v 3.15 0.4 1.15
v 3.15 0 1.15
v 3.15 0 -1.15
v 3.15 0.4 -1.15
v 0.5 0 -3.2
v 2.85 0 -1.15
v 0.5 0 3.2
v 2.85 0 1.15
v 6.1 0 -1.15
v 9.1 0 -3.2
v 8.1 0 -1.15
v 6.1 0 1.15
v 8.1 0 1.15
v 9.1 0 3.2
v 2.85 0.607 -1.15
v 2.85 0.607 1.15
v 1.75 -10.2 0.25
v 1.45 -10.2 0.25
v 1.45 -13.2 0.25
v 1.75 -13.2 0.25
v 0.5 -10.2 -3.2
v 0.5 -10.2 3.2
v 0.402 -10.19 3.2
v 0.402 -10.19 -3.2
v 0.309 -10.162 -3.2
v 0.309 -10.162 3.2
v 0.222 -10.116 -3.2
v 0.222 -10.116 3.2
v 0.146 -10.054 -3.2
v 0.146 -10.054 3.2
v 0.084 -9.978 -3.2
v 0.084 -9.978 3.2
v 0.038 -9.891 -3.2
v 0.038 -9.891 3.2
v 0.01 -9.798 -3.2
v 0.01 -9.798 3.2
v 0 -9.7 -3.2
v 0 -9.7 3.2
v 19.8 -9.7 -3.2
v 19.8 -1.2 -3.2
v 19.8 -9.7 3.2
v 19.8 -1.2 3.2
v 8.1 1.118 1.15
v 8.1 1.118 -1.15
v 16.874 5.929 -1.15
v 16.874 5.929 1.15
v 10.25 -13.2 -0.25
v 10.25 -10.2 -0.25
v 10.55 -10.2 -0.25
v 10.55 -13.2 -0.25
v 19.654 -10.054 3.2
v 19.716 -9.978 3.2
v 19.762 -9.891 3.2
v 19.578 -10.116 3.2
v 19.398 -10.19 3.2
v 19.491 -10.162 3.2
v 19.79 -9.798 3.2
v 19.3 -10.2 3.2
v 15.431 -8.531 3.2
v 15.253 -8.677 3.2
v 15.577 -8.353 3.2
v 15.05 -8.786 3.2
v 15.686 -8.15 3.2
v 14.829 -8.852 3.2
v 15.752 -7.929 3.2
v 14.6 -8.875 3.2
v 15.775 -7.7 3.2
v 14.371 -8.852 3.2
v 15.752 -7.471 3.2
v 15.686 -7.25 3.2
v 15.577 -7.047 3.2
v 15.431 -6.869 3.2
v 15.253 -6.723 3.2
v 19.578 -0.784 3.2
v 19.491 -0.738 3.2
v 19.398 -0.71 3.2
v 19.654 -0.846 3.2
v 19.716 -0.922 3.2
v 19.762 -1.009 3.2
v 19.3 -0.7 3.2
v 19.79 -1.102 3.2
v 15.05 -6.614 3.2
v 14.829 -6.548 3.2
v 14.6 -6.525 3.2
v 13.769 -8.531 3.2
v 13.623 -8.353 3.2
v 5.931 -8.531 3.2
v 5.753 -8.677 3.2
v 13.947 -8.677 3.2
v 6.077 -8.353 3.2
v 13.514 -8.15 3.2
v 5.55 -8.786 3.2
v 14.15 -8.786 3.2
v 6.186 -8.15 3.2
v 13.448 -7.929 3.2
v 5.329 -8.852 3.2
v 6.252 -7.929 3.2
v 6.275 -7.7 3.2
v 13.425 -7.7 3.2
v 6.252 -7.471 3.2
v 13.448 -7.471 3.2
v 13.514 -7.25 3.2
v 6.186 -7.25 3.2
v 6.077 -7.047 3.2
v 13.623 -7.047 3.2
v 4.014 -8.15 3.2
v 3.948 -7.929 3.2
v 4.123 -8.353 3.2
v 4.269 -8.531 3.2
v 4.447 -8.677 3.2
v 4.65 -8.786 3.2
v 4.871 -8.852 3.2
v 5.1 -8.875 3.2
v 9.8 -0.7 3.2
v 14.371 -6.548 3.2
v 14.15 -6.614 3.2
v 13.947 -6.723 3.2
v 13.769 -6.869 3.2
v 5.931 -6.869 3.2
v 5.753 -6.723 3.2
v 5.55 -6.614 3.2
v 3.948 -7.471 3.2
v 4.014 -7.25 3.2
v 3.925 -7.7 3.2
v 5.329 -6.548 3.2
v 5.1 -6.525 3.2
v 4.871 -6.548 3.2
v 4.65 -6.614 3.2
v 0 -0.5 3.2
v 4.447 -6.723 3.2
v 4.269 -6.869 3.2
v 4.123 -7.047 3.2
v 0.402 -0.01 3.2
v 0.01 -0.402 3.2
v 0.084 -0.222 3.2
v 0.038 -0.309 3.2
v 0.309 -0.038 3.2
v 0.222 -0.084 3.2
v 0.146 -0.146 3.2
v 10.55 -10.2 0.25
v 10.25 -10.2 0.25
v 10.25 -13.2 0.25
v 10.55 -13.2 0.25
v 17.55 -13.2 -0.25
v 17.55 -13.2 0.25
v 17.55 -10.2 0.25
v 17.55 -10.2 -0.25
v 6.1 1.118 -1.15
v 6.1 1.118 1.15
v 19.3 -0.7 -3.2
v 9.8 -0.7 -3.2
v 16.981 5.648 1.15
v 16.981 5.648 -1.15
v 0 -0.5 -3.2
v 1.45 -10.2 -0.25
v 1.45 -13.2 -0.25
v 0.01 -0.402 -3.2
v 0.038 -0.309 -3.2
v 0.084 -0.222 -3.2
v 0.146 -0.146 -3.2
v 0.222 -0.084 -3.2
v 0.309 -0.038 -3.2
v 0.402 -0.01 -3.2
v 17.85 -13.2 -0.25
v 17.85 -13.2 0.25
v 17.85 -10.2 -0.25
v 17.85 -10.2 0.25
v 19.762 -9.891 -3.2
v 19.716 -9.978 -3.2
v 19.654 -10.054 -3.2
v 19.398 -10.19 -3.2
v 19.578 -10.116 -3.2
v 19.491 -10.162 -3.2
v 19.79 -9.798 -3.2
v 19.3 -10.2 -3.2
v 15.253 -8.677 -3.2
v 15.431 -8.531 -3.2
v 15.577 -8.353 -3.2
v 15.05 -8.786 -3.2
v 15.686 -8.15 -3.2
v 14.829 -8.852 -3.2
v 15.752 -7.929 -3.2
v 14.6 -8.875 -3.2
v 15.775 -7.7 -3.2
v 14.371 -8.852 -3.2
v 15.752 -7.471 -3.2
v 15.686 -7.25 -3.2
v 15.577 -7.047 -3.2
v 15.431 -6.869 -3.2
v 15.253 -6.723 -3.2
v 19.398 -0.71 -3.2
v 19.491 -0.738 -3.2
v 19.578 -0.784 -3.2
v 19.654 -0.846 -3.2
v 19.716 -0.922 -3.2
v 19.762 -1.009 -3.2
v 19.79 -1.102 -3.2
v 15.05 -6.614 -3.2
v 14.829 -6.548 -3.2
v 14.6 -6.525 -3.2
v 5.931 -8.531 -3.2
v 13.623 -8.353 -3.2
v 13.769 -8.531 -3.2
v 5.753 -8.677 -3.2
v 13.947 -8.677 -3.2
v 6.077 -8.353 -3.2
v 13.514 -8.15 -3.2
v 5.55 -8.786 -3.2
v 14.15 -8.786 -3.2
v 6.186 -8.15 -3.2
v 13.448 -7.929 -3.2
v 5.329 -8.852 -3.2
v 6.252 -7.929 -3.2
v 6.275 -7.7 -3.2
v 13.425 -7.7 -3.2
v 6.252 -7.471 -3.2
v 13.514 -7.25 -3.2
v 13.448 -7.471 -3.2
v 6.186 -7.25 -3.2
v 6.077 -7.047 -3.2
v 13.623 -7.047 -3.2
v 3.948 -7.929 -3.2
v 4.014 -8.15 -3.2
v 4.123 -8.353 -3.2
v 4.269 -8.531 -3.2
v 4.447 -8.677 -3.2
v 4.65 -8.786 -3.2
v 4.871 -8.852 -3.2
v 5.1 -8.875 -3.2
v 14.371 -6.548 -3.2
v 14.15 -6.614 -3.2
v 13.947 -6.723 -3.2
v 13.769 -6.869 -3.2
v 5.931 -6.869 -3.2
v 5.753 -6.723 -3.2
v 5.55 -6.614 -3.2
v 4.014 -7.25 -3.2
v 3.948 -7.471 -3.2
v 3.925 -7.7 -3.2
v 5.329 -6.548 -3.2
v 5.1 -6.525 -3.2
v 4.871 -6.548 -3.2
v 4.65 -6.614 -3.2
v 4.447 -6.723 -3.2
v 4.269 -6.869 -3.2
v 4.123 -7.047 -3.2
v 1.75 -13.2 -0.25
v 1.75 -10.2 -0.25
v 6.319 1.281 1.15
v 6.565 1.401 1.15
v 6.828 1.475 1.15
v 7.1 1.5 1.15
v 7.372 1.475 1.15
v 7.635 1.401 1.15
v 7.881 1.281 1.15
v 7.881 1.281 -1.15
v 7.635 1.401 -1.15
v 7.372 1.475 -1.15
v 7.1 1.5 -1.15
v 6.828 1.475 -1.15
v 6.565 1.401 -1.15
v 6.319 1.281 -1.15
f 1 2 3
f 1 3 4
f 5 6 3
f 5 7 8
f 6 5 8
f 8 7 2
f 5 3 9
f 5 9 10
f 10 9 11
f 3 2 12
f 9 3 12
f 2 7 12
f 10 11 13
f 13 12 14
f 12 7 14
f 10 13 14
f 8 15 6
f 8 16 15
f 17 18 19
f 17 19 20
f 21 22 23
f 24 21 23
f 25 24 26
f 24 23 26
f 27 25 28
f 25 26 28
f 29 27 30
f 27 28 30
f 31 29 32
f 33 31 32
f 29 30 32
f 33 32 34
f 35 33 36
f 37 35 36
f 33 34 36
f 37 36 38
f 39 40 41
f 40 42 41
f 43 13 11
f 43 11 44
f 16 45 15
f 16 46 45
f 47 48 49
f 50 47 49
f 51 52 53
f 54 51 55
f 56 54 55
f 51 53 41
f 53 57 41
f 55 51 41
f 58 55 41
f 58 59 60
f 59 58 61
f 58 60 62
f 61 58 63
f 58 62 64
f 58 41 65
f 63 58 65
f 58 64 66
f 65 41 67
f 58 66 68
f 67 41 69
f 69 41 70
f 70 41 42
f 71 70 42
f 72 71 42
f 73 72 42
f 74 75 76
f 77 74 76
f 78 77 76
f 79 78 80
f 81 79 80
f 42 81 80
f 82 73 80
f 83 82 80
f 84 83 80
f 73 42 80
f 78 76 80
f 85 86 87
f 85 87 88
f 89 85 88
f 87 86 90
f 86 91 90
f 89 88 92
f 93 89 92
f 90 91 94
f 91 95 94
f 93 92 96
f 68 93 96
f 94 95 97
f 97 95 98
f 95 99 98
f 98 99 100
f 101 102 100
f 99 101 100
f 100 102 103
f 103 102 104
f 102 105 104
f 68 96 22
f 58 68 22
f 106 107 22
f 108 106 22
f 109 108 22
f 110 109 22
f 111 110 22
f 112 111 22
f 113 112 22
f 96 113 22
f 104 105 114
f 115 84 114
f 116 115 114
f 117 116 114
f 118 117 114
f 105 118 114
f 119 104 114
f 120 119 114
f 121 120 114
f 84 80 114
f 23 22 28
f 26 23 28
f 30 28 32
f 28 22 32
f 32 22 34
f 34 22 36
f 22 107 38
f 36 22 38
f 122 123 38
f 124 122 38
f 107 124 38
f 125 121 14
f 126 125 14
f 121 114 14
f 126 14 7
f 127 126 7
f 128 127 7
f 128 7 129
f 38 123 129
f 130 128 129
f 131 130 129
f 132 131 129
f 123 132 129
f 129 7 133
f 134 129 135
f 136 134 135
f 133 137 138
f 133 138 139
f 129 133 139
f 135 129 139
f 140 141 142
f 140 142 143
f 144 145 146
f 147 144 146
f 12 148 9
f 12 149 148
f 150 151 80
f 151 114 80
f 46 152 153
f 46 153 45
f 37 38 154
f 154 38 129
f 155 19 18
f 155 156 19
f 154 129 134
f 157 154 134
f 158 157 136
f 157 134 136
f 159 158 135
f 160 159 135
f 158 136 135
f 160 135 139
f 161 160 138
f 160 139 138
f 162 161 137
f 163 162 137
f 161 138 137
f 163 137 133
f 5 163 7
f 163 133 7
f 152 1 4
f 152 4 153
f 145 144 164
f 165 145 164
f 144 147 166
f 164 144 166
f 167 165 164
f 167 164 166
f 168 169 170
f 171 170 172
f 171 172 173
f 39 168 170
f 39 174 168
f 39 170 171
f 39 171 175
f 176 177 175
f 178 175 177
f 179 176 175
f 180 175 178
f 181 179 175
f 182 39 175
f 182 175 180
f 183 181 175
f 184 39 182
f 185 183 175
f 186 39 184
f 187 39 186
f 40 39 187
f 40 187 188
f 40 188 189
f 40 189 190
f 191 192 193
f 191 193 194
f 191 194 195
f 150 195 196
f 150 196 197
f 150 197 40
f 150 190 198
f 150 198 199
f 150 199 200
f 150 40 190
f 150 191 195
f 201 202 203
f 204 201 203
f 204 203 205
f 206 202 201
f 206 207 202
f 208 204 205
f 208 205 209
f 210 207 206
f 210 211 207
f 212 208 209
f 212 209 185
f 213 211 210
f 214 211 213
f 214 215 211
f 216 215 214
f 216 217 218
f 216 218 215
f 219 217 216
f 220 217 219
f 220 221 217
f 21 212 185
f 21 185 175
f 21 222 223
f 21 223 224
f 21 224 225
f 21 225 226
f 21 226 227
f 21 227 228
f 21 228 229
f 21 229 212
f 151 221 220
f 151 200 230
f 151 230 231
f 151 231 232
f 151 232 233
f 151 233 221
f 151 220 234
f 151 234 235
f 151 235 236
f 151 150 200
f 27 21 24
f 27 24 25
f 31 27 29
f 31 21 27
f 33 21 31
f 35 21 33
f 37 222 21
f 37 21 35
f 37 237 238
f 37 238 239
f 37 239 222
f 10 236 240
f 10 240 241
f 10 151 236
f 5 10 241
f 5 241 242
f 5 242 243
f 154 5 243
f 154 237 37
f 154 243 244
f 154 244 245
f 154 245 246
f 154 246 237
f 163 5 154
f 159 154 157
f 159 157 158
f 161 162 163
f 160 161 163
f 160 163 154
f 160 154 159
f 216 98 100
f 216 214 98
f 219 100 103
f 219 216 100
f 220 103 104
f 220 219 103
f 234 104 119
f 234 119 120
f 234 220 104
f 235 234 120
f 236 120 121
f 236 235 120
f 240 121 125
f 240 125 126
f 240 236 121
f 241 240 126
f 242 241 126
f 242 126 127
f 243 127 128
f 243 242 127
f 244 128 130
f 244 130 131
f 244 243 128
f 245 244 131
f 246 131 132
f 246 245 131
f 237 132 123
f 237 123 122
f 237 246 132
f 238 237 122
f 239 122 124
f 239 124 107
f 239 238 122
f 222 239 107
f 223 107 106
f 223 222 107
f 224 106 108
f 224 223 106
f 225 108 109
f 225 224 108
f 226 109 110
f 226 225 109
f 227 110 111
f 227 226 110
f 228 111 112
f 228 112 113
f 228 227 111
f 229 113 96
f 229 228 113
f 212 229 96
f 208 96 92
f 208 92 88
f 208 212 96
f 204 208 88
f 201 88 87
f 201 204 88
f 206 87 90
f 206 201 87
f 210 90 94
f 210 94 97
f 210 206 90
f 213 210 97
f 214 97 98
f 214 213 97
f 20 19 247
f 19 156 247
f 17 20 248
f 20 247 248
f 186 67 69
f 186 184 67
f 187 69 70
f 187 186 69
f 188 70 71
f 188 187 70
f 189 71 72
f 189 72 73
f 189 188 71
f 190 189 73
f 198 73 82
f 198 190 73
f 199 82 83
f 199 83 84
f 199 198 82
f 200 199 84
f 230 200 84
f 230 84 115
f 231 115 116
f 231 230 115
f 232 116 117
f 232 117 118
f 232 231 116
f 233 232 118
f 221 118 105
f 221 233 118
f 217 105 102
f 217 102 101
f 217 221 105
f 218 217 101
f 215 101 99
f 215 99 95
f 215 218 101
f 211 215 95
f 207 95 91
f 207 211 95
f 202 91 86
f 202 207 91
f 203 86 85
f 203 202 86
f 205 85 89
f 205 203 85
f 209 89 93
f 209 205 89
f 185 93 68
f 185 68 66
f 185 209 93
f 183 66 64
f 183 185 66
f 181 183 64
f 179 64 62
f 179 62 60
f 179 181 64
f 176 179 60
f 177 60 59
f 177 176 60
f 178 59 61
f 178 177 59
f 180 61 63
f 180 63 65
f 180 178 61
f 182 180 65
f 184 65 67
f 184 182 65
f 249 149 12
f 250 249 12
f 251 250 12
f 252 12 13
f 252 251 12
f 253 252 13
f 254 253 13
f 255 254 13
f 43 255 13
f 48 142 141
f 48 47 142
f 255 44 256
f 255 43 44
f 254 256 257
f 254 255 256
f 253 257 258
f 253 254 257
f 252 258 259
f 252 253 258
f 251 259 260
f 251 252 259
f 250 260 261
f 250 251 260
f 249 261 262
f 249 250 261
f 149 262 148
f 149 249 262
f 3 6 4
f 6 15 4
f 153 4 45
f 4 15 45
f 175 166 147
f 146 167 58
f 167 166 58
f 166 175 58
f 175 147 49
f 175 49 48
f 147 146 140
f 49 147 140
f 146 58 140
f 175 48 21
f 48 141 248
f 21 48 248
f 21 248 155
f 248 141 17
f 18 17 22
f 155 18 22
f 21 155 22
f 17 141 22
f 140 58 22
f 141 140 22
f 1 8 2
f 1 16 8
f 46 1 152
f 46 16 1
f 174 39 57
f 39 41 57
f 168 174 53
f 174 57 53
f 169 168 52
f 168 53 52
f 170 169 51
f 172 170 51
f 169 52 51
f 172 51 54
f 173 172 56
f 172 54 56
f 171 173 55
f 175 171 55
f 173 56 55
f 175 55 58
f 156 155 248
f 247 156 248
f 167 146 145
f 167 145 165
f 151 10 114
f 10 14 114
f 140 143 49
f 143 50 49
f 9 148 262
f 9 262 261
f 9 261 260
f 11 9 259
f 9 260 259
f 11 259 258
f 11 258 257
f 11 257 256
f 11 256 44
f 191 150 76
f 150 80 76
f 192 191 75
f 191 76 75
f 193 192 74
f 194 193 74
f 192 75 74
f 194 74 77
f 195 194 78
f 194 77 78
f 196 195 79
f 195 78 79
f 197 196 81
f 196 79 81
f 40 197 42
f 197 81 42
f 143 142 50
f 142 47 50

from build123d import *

# Parameters (mm, degrees)
SKETCH_1_R       = 1.175
EXTRUDE_1_DEPTH  = 3.2
EXTRUDE_2_DEPTH  = 1.15
EXTRUDE_10_DEPTH = 1.15
SKETCH_5_W       = 0.3
SKETCH_5_H       = 3
EXTRUDE_12_DEPTH = 0.25


with BuildPart() as part:
    # 草图1 → 凸台-拉伸1 (new, symmetric)
    with BuildSketch(Plane.XY):
        with BuildLine():
            Line((0.5, 0), (9.1, 0))
            Line((9.1, 0), (9.8, -0.7))
            Line((9.8, -0.7), (19.3, -0.7))
            ThreePointArc((19.3, -0.7), (19.653553391, -0.846446609), (19.8, -1.2))
            Line((19.8, -1.2), (19.8, -9.7))
            ThreePointArc((19.8, -9.7), (19.653553391, -10.053553391), (19.3, -10.2))
            Line((19.3, -10.2), (0.5, -10.2))
            ThreePointArc((0.5, -10.2), (0.146446609, -10.053553391), (0, -9.7))
            Line((0, -9.7), (0, -0.5))
            ThreePointArc((0, -0.5), (0.146446609, -0.146446609), (0.5, 0))
        make_face()
        with Locations((5.1, -7.7)):
            Circle(SKETCH_1_R, mode=Mode.SUBTRACT)
        with Locations((14.6, -7.7)):
            Circle(SKETCH_1_R, mode=Mode.SUBTRACT)
    extrude(amount=EXTRUDE_1_DEPTH, both=True)

    # 草图2 → 凸台-拉伸2 (add, symmetric)
    with BuildSketch(Plane.XY):
        with BuildLine():
            Line((6.1, 1.118033989), (6.1, 0))
            Line((6.1, 0), (8.1, 0))
            Line((8.1, 0), (8.1, 1.118033989))
            ThreePointArc((8.1, 1.118033989), (7.1, 1.5), (6.1, 1.118033989))
        make_face()
    extrude(amount=EXTRUDE_2_DEPTH, both=True)

    # 草图4 → 凸台-拉伸10 (add, symmetric)
    with BuildSketch(Plane.XY):
        Polygon((2.85, 0), (3.15, 0), (3.15, 0.4), (16.98060531, 5.648457972), (16.874167088, 5.928941314), (2.85, 0.60703024), align=None)
    extrude(amount=EXTRUDE_10_DEPTH, both=True)

    # 草图5 → 凸台-拉伸12 (add, symmetric)
    with BuildSketch(Plane.XY):
        with Locations((1.6, -11.7)):
            Rectangle(SKETCH_5_W, SKETCH_5_H)
        with Locations((10.4, -11.7)):
            Rectangle(SKETCH_5_W, SKETCH_5_H)
        with Locations((17.7, -11.7)):
            Rectangle(SKETCH_5_W, SKETCH_5_H)
    extrude(amount=EXTRUDE_12_DEPTH, both=True)


solid = part.part
